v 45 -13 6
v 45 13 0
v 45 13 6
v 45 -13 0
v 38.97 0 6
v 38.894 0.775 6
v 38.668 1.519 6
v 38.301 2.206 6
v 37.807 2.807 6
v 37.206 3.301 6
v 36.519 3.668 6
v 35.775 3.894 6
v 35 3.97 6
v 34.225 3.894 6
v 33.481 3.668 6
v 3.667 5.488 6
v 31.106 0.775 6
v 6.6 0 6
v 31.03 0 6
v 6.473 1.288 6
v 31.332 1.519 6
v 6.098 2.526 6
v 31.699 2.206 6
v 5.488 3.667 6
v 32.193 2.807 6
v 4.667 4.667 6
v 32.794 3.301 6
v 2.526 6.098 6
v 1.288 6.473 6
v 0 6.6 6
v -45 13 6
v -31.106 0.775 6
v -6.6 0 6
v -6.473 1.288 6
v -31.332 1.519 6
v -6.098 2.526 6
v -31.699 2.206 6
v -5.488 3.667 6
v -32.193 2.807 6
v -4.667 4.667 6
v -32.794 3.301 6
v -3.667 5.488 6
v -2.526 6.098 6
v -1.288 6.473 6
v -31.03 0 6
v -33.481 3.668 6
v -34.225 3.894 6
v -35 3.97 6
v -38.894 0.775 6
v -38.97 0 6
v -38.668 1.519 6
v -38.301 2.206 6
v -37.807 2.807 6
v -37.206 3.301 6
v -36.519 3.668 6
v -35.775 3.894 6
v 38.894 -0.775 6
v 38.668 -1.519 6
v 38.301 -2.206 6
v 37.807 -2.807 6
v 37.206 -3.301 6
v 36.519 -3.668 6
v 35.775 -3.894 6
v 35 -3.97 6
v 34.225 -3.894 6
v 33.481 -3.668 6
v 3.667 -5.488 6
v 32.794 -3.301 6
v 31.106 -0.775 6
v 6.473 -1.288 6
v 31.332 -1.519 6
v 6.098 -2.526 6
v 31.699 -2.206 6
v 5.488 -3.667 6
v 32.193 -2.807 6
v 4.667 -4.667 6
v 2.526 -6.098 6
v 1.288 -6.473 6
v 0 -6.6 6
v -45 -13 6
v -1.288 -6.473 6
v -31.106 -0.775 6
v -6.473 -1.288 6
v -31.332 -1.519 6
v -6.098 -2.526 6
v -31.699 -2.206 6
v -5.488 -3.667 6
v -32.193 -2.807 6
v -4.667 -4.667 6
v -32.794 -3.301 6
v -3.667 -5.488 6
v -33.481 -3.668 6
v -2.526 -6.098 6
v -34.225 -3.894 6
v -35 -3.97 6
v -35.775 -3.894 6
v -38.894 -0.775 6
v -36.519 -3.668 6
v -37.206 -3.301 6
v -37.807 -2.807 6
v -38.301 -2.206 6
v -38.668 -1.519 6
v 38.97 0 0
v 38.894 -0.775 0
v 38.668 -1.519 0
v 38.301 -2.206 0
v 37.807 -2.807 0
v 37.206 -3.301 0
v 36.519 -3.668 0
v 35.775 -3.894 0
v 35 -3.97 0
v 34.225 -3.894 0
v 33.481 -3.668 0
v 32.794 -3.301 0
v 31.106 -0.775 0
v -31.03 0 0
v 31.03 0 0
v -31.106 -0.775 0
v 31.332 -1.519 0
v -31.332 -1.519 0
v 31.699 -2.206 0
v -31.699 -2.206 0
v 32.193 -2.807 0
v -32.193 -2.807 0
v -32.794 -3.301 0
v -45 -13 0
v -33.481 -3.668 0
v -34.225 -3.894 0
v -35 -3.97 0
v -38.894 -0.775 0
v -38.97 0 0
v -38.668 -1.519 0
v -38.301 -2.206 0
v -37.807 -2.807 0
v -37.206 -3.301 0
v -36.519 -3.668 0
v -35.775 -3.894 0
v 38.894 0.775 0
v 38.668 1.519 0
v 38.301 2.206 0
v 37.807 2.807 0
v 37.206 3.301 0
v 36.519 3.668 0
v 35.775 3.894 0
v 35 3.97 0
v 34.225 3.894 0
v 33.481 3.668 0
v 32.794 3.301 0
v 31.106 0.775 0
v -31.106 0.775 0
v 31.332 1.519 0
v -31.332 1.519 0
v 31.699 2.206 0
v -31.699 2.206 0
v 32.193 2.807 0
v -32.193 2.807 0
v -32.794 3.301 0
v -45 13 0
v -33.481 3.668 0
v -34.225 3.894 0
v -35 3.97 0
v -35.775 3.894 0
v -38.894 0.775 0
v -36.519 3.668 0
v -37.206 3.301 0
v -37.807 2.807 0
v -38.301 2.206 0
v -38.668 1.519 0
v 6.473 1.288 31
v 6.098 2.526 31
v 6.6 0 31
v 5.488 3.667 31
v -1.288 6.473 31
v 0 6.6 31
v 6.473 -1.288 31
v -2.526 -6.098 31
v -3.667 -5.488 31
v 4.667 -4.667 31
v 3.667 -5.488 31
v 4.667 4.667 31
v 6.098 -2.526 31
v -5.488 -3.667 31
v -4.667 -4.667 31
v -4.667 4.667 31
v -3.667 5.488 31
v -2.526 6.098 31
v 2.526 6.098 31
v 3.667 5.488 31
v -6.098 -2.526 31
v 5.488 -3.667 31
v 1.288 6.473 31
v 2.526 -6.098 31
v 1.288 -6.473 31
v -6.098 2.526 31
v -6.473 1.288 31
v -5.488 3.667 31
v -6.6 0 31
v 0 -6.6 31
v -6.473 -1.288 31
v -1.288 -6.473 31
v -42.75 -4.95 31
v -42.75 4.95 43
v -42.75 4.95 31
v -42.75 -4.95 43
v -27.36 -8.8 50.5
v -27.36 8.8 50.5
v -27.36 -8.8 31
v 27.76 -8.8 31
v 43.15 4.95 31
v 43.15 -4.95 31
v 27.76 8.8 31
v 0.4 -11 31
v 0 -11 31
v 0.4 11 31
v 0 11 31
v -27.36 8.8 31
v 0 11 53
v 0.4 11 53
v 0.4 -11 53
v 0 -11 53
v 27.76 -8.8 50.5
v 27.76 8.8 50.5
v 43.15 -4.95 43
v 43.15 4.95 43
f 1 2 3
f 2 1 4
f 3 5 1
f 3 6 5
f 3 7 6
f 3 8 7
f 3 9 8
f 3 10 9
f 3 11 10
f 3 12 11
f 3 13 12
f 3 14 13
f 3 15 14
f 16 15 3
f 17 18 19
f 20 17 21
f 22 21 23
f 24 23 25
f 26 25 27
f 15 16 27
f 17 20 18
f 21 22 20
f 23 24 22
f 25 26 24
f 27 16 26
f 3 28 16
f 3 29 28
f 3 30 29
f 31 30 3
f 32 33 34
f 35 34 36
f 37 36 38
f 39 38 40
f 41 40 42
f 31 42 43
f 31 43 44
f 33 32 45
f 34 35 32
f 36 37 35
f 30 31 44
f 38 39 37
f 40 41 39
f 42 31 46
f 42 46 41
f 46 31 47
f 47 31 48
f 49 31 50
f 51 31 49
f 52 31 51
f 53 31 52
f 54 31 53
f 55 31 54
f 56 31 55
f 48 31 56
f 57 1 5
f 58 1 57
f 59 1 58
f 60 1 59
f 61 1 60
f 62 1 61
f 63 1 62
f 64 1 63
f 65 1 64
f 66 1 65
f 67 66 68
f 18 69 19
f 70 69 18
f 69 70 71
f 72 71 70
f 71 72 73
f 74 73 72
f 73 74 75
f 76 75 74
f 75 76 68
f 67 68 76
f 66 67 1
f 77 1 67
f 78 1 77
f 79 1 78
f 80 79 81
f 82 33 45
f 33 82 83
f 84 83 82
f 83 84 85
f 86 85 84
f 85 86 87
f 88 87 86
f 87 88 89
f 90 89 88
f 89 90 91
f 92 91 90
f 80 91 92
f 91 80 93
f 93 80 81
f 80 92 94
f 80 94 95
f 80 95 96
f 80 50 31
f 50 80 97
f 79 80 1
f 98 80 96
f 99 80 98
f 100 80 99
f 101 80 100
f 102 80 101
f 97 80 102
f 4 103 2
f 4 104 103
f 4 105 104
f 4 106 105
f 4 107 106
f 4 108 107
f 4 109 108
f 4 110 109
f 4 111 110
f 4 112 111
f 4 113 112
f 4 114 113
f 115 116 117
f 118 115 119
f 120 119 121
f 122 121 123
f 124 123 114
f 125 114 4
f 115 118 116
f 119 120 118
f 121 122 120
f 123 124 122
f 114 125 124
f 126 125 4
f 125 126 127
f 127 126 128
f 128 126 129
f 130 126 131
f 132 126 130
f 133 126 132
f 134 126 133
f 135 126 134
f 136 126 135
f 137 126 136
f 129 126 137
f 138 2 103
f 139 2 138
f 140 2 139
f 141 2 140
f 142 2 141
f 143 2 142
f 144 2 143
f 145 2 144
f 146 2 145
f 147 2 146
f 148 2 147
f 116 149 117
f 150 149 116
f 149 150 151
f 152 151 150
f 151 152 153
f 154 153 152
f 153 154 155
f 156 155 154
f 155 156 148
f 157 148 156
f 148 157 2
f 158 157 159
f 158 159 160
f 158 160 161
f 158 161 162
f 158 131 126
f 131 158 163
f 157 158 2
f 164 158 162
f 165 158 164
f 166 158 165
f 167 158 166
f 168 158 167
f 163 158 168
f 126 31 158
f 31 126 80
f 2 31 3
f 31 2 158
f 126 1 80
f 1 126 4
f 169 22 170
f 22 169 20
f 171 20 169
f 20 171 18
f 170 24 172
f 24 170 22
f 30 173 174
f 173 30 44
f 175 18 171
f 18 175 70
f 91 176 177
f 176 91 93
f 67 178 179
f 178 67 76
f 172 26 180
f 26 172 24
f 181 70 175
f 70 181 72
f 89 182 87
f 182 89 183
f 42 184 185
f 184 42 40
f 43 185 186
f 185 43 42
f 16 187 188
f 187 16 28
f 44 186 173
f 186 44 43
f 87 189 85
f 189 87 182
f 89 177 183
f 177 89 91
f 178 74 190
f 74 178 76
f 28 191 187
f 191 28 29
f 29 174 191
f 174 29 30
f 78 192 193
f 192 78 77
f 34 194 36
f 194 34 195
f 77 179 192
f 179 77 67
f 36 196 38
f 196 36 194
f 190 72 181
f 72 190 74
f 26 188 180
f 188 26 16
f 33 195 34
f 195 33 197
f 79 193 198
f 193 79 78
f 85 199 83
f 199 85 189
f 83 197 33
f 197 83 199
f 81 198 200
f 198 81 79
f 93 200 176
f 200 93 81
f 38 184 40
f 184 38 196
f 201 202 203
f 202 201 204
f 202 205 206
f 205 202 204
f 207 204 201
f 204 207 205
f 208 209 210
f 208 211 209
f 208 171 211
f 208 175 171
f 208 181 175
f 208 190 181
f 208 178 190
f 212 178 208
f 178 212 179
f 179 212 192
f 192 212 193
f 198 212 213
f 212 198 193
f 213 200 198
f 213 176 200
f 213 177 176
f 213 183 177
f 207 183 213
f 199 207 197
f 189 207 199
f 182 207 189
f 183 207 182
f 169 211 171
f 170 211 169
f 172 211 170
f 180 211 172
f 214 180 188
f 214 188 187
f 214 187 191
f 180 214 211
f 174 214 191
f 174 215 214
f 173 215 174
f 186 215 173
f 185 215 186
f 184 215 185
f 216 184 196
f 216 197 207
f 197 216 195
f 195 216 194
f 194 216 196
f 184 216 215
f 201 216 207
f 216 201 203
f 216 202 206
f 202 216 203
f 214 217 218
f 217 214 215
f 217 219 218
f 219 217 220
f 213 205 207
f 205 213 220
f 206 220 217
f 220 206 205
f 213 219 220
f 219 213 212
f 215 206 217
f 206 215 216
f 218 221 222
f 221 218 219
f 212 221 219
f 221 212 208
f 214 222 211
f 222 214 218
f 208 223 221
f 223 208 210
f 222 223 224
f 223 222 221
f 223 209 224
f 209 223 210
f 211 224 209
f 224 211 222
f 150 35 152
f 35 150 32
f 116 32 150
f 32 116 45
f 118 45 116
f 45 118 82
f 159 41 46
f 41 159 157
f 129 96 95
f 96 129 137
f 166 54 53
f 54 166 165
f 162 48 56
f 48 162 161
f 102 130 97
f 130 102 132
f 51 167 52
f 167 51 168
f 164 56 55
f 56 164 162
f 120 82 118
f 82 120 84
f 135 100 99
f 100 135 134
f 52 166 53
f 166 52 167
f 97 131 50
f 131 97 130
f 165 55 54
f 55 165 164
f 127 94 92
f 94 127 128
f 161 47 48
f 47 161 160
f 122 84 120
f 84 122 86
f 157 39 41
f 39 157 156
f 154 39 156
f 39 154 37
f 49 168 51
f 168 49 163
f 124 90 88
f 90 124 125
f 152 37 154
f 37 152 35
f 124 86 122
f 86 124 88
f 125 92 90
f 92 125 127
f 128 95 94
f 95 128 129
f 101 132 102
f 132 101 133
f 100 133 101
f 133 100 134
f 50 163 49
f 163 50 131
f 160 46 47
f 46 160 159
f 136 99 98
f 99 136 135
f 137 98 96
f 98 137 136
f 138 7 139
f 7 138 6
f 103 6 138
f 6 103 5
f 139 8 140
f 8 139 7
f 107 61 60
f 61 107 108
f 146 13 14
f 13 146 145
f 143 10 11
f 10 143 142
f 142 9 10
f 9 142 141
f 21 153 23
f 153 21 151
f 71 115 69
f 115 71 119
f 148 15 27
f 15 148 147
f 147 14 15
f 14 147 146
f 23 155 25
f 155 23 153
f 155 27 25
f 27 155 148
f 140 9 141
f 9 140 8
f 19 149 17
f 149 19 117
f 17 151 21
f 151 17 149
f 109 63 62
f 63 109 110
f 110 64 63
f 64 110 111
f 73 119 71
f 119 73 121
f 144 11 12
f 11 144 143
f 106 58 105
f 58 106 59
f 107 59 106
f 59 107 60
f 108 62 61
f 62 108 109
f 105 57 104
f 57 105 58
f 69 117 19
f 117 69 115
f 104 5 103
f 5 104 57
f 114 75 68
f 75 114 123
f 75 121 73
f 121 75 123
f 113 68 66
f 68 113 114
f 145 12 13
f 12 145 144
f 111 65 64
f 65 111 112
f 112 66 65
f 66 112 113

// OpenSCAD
$fn = 32;

// ----------------------------------------------------------------------
// Boat cleat: 90 mm base, horn 42 mm up
// ----------------------------------------------------------------------

// --- parameters (mm) ---
base_l = 90;              // base length
base_w = 26;              // base width
base_t = 6;               // base thickness
horn_len = 85.5;          // horn length
horn_d = 22;              // horn diameter at the middle
horn_z = 42;              // horn axis height
end_drop = 10;            // how far the horn tips drop
post_d = 13.2;            // centre post diameter
holes_d = 7.94;           // fixing holes
hole_x = 35;              // fixing hole spacing

difference() {
  union() {
    translate([-45, -13, 0]) cube([base_l, base_w, base_t]);
    /* centre post, sunk 1 mm into the base */
    translate([0, 0, 5]) cylinder(h = 37, d = post_d);
    /* horn: a hull chain of boxes, full in the middle and lighter at the tips */
    hull() {
      translate([-42.75, -4.95, 31]) cube([0.4, 9.9, 12], center = false);
      translate([-27.36, -8.8, 31]) cube([0.4, 17.6, 19.5], center = false);
    }
    hull() {
      translate([-27.36, -8.8, 31]) cube([0.4, 17.6, 19.5], center = false);
      translate([0, -11, 31]) cube([0.4, 22, 22], center = false);
    }
    hull() {
      translate([0, -11, 31]) cube([0.4, 22, 22], center = false);
      translate([27.36, -8.8, 31]) cube([0.4, 17.6, 19.5], center = false);
    }
    hull() {
      translate([27.36, -8.8, 31]) cube([0.4, 17.6, 19.5], center = false);
      translate([42.75, -4.95, 31]) cube([0.4, 9.9, 12], center = false);
    }
  }
  translate([-35, 0, -2.5]) cylinder(h = base_t + 5, d = holes_d);
  translate([35, 0, -2.5]) cylinder(h = base_t + 5, d = holes_d);
}
